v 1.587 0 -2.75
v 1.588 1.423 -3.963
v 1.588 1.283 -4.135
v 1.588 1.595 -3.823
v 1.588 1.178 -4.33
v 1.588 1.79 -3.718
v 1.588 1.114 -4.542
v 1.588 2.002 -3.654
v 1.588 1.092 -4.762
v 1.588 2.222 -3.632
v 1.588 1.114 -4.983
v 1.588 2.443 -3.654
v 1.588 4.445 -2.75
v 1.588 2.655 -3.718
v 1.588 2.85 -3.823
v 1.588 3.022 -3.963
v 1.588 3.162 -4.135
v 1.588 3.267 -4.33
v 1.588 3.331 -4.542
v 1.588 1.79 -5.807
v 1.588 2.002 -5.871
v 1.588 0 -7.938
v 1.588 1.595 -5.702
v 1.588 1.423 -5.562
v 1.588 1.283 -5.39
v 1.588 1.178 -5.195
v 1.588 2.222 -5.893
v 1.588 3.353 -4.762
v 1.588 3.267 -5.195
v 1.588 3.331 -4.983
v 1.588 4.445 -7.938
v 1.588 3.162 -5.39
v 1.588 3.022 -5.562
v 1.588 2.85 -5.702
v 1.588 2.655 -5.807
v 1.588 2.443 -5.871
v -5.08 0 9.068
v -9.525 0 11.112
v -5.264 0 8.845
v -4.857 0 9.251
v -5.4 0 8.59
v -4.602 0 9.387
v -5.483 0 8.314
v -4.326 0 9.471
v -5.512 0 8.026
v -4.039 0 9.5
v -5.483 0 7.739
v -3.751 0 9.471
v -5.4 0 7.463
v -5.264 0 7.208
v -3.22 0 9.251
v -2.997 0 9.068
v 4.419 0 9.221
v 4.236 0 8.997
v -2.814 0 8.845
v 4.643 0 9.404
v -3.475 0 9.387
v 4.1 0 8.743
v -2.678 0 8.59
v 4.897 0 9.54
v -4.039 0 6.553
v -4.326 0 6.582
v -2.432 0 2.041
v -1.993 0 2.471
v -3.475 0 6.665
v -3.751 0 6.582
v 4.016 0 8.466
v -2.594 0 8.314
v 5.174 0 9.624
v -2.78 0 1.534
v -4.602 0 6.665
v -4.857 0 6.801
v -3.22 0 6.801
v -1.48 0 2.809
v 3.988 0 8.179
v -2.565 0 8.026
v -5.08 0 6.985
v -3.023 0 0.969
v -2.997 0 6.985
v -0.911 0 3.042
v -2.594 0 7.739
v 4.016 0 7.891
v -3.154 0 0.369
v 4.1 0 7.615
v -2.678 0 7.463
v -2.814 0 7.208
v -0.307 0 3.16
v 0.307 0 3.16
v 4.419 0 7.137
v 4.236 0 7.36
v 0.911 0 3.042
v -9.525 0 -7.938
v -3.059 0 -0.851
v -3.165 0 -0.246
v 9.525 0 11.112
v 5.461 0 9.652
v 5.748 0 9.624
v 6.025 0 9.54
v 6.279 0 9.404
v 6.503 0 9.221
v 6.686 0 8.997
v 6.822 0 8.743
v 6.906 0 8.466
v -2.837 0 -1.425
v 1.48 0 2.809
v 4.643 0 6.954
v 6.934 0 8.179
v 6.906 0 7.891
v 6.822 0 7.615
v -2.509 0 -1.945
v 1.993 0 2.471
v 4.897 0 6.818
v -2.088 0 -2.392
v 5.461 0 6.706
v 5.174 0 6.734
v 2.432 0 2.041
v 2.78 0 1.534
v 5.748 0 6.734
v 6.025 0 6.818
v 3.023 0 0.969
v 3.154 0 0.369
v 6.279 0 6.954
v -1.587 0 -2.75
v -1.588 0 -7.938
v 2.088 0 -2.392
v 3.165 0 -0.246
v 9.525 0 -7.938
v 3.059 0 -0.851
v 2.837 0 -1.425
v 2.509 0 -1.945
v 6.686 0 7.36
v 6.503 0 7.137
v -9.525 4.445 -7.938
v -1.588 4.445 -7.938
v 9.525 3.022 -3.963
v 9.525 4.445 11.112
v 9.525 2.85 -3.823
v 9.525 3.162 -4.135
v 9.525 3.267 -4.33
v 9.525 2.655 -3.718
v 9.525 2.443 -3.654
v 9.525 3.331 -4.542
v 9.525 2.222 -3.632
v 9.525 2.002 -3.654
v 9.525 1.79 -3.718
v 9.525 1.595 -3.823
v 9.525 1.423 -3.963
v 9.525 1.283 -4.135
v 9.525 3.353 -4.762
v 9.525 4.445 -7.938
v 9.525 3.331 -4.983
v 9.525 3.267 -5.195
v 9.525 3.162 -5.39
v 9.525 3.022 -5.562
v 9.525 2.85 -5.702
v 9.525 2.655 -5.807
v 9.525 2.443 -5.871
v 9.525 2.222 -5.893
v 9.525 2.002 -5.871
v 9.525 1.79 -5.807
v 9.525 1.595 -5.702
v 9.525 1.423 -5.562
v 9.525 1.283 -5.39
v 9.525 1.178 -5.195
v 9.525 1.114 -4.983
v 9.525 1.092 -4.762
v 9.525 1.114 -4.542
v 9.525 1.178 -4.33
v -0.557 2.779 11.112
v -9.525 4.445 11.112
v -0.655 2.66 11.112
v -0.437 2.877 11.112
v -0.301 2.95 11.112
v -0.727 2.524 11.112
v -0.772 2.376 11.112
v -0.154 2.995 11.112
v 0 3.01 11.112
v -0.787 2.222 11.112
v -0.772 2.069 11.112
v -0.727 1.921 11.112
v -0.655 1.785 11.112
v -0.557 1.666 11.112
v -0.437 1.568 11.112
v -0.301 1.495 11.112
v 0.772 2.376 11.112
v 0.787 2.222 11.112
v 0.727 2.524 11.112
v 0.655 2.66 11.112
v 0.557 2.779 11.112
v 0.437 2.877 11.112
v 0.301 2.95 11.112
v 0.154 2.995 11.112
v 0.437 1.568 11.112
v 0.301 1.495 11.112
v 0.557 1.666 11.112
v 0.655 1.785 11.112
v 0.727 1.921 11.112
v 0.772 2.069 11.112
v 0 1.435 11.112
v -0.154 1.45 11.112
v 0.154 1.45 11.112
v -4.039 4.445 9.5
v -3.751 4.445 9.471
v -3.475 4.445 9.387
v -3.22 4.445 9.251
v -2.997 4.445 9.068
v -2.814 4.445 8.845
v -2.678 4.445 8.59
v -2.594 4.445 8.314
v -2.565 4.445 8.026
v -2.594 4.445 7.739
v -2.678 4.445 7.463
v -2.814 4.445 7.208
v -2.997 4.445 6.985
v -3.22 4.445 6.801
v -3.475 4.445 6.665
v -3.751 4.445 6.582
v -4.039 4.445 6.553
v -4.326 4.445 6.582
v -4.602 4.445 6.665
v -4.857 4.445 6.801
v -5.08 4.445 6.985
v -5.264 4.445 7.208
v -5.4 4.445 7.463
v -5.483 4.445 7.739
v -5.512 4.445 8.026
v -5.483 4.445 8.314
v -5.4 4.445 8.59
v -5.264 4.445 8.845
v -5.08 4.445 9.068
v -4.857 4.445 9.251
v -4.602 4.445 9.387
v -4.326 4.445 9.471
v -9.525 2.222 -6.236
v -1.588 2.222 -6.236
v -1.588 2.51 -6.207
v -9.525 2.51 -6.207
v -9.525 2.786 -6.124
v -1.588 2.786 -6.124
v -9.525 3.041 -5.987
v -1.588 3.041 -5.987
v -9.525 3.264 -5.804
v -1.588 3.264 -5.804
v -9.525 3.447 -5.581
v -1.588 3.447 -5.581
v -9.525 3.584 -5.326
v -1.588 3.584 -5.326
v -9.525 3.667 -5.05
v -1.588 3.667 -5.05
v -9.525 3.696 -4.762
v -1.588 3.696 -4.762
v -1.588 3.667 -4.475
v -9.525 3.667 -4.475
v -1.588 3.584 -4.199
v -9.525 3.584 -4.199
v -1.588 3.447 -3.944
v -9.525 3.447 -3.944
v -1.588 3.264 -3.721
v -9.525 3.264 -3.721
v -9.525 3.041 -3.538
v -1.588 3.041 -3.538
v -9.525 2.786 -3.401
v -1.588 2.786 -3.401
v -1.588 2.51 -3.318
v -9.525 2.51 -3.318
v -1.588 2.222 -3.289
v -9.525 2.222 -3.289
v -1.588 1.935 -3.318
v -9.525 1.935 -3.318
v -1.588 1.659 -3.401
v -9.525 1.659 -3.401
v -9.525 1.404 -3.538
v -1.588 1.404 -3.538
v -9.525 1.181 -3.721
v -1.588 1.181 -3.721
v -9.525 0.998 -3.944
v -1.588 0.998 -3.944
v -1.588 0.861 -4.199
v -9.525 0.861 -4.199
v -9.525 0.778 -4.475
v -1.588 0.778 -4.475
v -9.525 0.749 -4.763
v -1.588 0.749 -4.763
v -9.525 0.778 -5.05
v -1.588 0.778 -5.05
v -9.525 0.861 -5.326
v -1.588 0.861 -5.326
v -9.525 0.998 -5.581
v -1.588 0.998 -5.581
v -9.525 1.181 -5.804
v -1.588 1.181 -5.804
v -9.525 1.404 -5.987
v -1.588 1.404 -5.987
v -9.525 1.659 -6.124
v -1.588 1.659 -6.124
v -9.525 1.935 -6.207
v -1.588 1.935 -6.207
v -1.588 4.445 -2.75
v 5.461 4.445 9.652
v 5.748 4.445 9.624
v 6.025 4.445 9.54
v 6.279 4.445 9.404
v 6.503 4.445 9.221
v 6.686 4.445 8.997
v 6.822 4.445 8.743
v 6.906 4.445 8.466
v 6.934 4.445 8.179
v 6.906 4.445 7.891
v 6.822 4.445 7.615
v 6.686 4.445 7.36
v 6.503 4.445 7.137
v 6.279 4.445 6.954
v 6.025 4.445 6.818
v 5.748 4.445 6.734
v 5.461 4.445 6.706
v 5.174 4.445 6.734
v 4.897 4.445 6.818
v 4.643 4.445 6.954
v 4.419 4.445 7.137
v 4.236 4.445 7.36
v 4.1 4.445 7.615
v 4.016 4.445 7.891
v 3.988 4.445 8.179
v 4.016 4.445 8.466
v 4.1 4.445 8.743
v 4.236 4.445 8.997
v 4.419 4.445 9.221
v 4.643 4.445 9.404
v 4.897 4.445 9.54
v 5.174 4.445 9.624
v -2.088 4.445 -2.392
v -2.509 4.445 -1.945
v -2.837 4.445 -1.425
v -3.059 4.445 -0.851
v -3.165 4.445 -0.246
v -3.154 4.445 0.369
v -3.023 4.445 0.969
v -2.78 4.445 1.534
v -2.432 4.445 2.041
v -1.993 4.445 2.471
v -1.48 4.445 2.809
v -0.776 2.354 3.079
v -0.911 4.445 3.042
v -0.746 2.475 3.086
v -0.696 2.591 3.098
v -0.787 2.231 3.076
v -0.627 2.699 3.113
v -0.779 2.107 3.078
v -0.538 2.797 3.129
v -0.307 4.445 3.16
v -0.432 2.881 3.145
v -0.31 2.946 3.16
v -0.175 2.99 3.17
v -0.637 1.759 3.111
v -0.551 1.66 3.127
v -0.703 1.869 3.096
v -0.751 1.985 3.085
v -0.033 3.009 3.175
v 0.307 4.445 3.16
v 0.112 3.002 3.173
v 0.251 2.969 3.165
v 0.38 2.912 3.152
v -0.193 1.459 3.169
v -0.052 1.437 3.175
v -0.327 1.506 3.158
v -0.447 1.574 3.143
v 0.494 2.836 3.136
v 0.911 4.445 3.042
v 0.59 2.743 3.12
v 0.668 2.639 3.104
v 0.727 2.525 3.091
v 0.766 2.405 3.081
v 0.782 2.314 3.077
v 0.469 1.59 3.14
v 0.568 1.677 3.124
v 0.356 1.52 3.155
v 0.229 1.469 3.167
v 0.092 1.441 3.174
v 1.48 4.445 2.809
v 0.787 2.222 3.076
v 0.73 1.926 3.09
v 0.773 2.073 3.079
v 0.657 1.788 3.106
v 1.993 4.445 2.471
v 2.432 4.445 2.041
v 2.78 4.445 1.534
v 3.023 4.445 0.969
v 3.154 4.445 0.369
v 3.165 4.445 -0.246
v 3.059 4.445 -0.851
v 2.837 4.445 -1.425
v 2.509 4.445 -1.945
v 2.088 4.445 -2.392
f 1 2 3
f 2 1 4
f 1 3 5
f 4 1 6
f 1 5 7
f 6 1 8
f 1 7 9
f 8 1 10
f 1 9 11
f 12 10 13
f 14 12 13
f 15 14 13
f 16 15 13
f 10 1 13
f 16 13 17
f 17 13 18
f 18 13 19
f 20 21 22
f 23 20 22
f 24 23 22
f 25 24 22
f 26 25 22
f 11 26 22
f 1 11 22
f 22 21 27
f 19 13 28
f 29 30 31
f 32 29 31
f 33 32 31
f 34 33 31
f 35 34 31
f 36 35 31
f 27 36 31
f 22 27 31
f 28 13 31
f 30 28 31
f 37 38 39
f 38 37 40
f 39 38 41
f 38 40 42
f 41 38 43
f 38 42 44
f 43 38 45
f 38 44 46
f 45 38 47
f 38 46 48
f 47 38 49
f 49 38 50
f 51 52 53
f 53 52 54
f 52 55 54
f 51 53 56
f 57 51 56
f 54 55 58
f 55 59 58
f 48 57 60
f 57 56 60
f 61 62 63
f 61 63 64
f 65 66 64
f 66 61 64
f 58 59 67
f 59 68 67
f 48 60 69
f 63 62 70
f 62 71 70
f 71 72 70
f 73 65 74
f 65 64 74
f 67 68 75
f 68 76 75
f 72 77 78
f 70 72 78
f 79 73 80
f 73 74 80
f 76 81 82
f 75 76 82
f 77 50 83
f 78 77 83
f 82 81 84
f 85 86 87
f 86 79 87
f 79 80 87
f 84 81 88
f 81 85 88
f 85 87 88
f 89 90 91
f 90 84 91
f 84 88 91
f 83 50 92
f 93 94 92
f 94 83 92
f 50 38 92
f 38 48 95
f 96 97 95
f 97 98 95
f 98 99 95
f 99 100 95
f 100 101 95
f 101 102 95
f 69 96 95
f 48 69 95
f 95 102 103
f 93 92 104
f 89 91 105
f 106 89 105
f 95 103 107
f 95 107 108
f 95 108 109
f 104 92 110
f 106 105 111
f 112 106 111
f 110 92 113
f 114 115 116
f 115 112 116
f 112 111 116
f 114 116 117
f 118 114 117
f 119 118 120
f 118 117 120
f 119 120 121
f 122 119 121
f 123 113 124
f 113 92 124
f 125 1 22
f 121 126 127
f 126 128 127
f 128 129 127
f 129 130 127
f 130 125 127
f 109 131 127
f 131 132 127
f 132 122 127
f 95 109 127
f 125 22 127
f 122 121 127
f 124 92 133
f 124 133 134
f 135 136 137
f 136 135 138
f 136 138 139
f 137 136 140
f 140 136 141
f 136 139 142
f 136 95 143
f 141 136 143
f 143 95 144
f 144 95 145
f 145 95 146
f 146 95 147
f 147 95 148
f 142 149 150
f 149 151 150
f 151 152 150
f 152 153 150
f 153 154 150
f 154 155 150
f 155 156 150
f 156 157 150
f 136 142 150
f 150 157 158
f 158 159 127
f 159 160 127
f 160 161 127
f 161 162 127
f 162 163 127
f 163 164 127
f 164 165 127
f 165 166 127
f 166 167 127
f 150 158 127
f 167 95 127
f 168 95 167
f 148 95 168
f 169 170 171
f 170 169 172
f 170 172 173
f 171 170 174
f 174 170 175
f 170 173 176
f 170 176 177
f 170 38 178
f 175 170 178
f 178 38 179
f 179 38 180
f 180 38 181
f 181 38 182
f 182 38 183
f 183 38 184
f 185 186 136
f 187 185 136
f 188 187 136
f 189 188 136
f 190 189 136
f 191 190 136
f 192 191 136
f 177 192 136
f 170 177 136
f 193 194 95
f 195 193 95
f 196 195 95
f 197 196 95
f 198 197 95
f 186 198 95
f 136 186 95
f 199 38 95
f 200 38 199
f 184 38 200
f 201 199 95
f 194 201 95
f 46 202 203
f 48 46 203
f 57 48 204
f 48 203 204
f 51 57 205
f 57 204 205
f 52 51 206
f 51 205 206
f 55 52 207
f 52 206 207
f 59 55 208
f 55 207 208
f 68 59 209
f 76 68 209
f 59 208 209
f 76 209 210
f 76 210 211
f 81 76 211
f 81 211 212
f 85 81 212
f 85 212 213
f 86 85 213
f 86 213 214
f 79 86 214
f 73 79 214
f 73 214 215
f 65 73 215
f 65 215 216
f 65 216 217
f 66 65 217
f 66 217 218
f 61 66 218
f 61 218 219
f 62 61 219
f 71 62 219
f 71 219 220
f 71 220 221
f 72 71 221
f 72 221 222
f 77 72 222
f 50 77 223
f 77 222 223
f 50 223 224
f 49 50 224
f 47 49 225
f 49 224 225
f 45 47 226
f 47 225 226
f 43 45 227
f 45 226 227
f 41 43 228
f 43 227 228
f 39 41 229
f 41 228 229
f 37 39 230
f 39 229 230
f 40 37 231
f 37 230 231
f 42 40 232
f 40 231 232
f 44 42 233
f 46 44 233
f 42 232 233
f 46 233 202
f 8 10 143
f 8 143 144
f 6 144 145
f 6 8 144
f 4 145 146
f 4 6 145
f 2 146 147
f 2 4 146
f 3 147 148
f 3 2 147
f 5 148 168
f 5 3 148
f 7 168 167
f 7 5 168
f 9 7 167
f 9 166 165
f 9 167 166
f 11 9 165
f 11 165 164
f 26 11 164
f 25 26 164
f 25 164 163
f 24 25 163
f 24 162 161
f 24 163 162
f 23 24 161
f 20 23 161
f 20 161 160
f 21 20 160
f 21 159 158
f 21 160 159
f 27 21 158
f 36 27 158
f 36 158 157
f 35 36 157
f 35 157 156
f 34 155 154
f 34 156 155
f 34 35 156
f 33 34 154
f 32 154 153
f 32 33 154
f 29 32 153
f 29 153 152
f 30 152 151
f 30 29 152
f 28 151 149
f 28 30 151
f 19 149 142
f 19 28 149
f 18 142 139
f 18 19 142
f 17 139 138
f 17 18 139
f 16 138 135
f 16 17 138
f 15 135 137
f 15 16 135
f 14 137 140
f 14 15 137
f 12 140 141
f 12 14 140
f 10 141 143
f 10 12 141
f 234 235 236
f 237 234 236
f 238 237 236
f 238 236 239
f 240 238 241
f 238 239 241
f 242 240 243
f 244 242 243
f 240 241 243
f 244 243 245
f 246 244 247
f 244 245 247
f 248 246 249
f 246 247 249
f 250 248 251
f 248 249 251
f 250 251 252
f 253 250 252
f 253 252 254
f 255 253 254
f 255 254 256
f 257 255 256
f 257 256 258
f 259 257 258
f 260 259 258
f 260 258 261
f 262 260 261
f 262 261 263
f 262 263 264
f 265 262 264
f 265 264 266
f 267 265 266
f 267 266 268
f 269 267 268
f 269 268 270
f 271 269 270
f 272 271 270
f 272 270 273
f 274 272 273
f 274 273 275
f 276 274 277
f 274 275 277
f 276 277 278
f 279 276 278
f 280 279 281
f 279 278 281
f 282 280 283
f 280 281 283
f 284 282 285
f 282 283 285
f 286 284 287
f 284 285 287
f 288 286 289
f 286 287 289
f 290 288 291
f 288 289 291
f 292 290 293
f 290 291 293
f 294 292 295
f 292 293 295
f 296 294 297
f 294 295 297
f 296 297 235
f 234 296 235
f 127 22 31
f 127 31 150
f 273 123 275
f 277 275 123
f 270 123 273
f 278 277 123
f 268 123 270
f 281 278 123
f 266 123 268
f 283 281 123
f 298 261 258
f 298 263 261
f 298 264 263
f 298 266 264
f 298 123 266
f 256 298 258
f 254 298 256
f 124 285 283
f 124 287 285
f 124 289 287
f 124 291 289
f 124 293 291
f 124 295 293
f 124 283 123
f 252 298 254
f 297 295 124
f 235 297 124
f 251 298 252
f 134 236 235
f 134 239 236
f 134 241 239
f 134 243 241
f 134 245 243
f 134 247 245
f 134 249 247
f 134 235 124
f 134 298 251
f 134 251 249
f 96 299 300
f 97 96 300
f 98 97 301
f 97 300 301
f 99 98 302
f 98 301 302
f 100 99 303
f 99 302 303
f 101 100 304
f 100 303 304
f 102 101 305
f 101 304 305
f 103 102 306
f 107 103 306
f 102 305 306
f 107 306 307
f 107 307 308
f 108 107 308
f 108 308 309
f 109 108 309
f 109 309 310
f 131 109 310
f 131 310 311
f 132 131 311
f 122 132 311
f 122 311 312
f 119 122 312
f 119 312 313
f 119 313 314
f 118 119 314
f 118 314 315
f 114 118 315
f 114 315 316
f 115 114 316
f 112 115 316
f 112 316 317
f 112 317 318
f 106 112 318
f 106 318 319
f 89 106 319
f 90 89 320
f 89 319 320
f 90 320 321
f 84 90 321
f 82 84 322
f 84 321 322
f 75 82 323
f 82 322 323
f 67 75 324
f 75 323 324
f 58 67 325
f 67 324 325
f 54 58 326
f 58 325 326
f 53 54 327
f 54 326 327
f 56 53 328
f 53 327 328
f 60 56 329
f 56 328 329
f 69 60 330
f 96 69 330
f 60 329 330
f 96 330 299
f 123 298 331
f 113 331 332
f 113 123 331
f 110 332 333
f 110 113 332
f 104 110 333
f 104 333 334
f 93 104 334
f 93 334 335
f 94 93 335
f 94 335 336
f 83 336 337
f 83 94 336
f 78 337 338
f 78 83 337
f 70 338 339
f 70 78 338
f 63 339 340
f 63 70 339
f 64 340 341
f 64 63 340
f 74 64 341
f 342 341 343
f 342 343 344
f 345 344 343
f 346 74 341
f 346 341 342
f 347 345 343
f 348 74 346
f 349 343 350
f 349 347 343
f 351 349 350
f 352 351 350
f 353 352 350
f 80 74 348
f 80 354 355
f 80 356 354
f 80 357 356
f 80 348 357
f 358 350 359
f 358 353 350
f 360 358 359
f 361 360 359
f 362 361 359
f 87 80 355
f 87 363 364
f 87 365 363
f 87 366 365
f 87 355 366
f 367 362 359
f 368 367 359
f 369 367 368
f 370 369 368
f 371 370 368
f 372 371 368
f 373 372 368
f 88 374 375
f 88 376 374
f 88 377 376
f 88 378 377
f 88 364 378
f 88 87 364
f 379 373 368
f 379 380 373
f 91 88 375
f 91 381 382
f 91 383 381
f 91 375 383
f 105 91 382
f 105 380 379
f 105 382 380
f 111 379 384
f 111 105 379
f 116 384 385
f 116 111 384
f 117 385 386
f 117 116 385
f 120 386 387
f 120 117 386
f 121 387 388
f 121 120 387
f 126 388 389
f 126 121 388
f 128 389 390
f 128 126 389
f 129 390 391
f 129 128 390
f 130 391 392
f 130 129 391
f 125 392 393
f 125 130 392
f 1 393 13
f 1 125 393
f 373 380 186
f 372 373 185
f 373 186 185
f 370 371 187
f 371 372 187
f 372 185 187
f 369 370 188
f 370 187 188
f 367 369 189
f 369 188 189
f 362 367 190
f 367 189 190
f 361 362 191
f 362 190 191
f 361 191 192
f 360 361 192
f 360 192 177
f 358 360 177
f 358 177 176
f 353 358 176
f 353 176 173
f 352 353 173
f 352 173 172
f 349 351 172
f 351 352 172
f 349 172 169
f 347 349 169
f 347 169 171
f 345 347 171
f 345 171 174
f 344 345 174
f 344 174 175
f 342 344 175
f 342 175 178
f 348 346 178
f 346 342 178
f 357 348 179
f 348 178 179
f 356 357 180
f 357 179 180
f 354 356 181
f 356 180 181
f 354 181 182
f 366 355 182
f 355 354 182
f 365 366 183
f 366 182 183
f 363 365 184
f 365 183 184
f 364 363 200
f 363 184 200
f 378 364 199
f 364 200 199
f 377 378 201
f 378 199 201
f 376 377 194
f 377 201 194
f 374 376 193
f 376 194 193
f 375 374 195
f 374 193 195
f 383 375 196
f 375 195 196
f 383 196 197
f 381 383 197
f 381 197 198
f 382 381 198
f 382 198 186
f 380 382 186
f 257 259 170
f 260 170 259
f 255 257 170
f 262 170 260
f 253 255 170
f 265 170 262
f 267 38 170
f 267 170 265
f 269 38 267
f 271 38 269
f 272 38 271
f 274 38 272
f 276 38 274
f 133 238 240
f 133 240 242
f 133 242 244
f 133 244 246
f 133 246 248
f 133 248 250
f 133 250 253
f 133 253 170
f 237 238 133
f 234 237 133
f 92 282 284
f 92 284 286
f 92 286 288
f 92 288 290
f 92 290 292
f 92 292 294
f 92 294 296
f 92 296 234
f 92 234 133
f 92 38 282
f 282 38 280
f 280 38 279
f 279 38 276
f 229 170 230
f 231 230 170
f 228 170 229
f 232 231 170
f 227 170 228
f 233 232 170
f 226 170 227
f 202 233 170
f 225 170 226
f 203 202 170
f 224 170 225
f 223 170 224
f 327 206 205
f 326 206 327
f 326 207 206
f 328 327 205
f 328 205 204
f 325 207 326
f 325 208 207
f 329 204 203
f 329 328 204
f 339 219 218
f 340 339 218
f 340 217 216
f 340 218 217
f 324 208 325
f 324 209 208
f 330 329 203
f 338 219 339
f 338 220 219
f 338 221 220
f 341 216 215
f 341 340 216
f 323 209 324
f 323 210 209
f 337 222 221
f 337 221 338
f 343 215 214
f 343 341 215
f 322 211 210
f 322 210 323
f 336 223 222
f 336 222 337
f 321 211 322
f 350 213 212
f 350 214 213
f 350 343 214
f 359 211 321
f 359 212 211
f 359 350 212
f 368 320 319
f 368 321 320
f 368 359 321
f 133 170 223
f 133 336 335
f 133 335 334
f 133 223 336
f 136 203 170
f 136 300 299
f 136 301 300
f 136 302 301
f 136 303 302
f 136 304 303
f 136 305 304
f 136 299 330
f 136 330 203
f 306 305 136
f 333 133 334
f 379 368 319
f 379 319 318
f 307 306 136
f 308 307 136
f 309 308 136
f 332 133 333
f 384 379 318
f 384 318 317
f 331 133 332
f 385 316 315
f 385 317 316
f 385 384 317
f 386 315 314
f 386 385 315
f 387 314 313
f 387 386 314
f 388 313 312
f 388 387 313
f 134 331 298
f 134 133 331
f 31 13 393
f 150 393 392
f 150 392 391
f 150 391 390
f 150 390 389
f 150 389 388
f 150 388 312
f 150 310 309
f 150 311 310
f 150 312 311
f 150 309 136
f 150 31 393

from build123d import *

# Parameters (mm, degrees)
SKETCH1_W           = 19.05
SKETCH1_H           = 19.05
SKETCH1_R           = 3.175
BOSS_EXTRUDE1_DEPTH = 4.445
SKETCH2_R           = 1.4732
SKETCH2_W           = 3.175
SKETCH2_H           = 5.187869343
CUT_EXTRUDE1_DEPTH  = 16.296120627
SKETCH4_R           = 0.7874
CUT_EXTRUDE3_DEPTH  = 22.757438958
SKETCH6_R           = 1.1303
CUT_EXTRUDE5_DEPTH  = 16.296120729
SKETCH7_R           = 1.4732
CUT_EXTRUDE6_DEPTH  = 16.296120729


with BuildPart() as part:
    # Sketch1 → Boss-Extrude1 (new body)
    with BuildSketch(Plane(origin=(0, 0, 0), x_dir=(1, 0, 0), z_dir=(0, 1, 0))):
        with Locations((0, -1.5875)):
            Rectangle(SKETCH1_W, SKETCH1_H)
        with Locations(Location((0, 0, 0), (0, 0, 270))):
            Circle(SKETCH1_R, mode=Mode.SUBTRACT)
    extrude(amount=BOSS_EXTRUDE1_DEPTH)

    # Sketch2 → Cut-Extrude1 (cut, through all)
    with BuildSketch(Plane(origin=(0, 4.445, 0), x_dir=(1, 0, 0), z_dir=(0, 1, 0))):
        with Locations(Location((5.461, -8.1788, 0), (0, 0, 270))):
            Circle(SKETCH2_R)
        with Locations(Location((-4.0386, -8.0264, 0), (0, 0, 270))):
            Circle(SKETCH2_R)
        with Locations((0, 5.343565329)):
            Rectangle(SKETCH2_W, SKETCH2_H)
    extrude(amount=-CUT_EXTRUDE1_DEPTH, mode=Mode.SUBTRACT)

    # Sketch4 → Cut-Extrude3 (cut, through all)
    with BuildSketch(Plane.XY.offset(11.1125)):
        with Locations((0, 2.2225)):
            Circle(SKETCH4_R)
    extrude(amount=-CUT_EXTRUDE3_DEPTH, mode=Mode.SUBTRACT)

    # Sketch6 → Cut-Extrude5 (cut, through all)
    with BuildSketch(Plane(origin=(0, 0, 0), x_dir=(0, 0, -1), z_dir=(1, 0, 0))):
        with Locations(Location((4.7625, 2.2225, 0), (0, 0, 180))):
            Circle(SKETCH6_R)
    extrude(amount=CUT_EXTRUDE5_DEPTH, mode=Mode.SUBTRACT)

    # Sketch7 → Cut-Extrude6 (cut, through all)
    with BuildSketch(Plane(origin=(0, 0, 0), x_dir=(0, 0, -1), z_dir=(1, 0, 0))):
        with Locations((4.7625, 2.2225)):
            Circle(SKETCH7_R)
    extrude(amount=-CUT_EXTRUDE6_DEPTH, mode=Mode.SUBTRACT)


solid = part.part
